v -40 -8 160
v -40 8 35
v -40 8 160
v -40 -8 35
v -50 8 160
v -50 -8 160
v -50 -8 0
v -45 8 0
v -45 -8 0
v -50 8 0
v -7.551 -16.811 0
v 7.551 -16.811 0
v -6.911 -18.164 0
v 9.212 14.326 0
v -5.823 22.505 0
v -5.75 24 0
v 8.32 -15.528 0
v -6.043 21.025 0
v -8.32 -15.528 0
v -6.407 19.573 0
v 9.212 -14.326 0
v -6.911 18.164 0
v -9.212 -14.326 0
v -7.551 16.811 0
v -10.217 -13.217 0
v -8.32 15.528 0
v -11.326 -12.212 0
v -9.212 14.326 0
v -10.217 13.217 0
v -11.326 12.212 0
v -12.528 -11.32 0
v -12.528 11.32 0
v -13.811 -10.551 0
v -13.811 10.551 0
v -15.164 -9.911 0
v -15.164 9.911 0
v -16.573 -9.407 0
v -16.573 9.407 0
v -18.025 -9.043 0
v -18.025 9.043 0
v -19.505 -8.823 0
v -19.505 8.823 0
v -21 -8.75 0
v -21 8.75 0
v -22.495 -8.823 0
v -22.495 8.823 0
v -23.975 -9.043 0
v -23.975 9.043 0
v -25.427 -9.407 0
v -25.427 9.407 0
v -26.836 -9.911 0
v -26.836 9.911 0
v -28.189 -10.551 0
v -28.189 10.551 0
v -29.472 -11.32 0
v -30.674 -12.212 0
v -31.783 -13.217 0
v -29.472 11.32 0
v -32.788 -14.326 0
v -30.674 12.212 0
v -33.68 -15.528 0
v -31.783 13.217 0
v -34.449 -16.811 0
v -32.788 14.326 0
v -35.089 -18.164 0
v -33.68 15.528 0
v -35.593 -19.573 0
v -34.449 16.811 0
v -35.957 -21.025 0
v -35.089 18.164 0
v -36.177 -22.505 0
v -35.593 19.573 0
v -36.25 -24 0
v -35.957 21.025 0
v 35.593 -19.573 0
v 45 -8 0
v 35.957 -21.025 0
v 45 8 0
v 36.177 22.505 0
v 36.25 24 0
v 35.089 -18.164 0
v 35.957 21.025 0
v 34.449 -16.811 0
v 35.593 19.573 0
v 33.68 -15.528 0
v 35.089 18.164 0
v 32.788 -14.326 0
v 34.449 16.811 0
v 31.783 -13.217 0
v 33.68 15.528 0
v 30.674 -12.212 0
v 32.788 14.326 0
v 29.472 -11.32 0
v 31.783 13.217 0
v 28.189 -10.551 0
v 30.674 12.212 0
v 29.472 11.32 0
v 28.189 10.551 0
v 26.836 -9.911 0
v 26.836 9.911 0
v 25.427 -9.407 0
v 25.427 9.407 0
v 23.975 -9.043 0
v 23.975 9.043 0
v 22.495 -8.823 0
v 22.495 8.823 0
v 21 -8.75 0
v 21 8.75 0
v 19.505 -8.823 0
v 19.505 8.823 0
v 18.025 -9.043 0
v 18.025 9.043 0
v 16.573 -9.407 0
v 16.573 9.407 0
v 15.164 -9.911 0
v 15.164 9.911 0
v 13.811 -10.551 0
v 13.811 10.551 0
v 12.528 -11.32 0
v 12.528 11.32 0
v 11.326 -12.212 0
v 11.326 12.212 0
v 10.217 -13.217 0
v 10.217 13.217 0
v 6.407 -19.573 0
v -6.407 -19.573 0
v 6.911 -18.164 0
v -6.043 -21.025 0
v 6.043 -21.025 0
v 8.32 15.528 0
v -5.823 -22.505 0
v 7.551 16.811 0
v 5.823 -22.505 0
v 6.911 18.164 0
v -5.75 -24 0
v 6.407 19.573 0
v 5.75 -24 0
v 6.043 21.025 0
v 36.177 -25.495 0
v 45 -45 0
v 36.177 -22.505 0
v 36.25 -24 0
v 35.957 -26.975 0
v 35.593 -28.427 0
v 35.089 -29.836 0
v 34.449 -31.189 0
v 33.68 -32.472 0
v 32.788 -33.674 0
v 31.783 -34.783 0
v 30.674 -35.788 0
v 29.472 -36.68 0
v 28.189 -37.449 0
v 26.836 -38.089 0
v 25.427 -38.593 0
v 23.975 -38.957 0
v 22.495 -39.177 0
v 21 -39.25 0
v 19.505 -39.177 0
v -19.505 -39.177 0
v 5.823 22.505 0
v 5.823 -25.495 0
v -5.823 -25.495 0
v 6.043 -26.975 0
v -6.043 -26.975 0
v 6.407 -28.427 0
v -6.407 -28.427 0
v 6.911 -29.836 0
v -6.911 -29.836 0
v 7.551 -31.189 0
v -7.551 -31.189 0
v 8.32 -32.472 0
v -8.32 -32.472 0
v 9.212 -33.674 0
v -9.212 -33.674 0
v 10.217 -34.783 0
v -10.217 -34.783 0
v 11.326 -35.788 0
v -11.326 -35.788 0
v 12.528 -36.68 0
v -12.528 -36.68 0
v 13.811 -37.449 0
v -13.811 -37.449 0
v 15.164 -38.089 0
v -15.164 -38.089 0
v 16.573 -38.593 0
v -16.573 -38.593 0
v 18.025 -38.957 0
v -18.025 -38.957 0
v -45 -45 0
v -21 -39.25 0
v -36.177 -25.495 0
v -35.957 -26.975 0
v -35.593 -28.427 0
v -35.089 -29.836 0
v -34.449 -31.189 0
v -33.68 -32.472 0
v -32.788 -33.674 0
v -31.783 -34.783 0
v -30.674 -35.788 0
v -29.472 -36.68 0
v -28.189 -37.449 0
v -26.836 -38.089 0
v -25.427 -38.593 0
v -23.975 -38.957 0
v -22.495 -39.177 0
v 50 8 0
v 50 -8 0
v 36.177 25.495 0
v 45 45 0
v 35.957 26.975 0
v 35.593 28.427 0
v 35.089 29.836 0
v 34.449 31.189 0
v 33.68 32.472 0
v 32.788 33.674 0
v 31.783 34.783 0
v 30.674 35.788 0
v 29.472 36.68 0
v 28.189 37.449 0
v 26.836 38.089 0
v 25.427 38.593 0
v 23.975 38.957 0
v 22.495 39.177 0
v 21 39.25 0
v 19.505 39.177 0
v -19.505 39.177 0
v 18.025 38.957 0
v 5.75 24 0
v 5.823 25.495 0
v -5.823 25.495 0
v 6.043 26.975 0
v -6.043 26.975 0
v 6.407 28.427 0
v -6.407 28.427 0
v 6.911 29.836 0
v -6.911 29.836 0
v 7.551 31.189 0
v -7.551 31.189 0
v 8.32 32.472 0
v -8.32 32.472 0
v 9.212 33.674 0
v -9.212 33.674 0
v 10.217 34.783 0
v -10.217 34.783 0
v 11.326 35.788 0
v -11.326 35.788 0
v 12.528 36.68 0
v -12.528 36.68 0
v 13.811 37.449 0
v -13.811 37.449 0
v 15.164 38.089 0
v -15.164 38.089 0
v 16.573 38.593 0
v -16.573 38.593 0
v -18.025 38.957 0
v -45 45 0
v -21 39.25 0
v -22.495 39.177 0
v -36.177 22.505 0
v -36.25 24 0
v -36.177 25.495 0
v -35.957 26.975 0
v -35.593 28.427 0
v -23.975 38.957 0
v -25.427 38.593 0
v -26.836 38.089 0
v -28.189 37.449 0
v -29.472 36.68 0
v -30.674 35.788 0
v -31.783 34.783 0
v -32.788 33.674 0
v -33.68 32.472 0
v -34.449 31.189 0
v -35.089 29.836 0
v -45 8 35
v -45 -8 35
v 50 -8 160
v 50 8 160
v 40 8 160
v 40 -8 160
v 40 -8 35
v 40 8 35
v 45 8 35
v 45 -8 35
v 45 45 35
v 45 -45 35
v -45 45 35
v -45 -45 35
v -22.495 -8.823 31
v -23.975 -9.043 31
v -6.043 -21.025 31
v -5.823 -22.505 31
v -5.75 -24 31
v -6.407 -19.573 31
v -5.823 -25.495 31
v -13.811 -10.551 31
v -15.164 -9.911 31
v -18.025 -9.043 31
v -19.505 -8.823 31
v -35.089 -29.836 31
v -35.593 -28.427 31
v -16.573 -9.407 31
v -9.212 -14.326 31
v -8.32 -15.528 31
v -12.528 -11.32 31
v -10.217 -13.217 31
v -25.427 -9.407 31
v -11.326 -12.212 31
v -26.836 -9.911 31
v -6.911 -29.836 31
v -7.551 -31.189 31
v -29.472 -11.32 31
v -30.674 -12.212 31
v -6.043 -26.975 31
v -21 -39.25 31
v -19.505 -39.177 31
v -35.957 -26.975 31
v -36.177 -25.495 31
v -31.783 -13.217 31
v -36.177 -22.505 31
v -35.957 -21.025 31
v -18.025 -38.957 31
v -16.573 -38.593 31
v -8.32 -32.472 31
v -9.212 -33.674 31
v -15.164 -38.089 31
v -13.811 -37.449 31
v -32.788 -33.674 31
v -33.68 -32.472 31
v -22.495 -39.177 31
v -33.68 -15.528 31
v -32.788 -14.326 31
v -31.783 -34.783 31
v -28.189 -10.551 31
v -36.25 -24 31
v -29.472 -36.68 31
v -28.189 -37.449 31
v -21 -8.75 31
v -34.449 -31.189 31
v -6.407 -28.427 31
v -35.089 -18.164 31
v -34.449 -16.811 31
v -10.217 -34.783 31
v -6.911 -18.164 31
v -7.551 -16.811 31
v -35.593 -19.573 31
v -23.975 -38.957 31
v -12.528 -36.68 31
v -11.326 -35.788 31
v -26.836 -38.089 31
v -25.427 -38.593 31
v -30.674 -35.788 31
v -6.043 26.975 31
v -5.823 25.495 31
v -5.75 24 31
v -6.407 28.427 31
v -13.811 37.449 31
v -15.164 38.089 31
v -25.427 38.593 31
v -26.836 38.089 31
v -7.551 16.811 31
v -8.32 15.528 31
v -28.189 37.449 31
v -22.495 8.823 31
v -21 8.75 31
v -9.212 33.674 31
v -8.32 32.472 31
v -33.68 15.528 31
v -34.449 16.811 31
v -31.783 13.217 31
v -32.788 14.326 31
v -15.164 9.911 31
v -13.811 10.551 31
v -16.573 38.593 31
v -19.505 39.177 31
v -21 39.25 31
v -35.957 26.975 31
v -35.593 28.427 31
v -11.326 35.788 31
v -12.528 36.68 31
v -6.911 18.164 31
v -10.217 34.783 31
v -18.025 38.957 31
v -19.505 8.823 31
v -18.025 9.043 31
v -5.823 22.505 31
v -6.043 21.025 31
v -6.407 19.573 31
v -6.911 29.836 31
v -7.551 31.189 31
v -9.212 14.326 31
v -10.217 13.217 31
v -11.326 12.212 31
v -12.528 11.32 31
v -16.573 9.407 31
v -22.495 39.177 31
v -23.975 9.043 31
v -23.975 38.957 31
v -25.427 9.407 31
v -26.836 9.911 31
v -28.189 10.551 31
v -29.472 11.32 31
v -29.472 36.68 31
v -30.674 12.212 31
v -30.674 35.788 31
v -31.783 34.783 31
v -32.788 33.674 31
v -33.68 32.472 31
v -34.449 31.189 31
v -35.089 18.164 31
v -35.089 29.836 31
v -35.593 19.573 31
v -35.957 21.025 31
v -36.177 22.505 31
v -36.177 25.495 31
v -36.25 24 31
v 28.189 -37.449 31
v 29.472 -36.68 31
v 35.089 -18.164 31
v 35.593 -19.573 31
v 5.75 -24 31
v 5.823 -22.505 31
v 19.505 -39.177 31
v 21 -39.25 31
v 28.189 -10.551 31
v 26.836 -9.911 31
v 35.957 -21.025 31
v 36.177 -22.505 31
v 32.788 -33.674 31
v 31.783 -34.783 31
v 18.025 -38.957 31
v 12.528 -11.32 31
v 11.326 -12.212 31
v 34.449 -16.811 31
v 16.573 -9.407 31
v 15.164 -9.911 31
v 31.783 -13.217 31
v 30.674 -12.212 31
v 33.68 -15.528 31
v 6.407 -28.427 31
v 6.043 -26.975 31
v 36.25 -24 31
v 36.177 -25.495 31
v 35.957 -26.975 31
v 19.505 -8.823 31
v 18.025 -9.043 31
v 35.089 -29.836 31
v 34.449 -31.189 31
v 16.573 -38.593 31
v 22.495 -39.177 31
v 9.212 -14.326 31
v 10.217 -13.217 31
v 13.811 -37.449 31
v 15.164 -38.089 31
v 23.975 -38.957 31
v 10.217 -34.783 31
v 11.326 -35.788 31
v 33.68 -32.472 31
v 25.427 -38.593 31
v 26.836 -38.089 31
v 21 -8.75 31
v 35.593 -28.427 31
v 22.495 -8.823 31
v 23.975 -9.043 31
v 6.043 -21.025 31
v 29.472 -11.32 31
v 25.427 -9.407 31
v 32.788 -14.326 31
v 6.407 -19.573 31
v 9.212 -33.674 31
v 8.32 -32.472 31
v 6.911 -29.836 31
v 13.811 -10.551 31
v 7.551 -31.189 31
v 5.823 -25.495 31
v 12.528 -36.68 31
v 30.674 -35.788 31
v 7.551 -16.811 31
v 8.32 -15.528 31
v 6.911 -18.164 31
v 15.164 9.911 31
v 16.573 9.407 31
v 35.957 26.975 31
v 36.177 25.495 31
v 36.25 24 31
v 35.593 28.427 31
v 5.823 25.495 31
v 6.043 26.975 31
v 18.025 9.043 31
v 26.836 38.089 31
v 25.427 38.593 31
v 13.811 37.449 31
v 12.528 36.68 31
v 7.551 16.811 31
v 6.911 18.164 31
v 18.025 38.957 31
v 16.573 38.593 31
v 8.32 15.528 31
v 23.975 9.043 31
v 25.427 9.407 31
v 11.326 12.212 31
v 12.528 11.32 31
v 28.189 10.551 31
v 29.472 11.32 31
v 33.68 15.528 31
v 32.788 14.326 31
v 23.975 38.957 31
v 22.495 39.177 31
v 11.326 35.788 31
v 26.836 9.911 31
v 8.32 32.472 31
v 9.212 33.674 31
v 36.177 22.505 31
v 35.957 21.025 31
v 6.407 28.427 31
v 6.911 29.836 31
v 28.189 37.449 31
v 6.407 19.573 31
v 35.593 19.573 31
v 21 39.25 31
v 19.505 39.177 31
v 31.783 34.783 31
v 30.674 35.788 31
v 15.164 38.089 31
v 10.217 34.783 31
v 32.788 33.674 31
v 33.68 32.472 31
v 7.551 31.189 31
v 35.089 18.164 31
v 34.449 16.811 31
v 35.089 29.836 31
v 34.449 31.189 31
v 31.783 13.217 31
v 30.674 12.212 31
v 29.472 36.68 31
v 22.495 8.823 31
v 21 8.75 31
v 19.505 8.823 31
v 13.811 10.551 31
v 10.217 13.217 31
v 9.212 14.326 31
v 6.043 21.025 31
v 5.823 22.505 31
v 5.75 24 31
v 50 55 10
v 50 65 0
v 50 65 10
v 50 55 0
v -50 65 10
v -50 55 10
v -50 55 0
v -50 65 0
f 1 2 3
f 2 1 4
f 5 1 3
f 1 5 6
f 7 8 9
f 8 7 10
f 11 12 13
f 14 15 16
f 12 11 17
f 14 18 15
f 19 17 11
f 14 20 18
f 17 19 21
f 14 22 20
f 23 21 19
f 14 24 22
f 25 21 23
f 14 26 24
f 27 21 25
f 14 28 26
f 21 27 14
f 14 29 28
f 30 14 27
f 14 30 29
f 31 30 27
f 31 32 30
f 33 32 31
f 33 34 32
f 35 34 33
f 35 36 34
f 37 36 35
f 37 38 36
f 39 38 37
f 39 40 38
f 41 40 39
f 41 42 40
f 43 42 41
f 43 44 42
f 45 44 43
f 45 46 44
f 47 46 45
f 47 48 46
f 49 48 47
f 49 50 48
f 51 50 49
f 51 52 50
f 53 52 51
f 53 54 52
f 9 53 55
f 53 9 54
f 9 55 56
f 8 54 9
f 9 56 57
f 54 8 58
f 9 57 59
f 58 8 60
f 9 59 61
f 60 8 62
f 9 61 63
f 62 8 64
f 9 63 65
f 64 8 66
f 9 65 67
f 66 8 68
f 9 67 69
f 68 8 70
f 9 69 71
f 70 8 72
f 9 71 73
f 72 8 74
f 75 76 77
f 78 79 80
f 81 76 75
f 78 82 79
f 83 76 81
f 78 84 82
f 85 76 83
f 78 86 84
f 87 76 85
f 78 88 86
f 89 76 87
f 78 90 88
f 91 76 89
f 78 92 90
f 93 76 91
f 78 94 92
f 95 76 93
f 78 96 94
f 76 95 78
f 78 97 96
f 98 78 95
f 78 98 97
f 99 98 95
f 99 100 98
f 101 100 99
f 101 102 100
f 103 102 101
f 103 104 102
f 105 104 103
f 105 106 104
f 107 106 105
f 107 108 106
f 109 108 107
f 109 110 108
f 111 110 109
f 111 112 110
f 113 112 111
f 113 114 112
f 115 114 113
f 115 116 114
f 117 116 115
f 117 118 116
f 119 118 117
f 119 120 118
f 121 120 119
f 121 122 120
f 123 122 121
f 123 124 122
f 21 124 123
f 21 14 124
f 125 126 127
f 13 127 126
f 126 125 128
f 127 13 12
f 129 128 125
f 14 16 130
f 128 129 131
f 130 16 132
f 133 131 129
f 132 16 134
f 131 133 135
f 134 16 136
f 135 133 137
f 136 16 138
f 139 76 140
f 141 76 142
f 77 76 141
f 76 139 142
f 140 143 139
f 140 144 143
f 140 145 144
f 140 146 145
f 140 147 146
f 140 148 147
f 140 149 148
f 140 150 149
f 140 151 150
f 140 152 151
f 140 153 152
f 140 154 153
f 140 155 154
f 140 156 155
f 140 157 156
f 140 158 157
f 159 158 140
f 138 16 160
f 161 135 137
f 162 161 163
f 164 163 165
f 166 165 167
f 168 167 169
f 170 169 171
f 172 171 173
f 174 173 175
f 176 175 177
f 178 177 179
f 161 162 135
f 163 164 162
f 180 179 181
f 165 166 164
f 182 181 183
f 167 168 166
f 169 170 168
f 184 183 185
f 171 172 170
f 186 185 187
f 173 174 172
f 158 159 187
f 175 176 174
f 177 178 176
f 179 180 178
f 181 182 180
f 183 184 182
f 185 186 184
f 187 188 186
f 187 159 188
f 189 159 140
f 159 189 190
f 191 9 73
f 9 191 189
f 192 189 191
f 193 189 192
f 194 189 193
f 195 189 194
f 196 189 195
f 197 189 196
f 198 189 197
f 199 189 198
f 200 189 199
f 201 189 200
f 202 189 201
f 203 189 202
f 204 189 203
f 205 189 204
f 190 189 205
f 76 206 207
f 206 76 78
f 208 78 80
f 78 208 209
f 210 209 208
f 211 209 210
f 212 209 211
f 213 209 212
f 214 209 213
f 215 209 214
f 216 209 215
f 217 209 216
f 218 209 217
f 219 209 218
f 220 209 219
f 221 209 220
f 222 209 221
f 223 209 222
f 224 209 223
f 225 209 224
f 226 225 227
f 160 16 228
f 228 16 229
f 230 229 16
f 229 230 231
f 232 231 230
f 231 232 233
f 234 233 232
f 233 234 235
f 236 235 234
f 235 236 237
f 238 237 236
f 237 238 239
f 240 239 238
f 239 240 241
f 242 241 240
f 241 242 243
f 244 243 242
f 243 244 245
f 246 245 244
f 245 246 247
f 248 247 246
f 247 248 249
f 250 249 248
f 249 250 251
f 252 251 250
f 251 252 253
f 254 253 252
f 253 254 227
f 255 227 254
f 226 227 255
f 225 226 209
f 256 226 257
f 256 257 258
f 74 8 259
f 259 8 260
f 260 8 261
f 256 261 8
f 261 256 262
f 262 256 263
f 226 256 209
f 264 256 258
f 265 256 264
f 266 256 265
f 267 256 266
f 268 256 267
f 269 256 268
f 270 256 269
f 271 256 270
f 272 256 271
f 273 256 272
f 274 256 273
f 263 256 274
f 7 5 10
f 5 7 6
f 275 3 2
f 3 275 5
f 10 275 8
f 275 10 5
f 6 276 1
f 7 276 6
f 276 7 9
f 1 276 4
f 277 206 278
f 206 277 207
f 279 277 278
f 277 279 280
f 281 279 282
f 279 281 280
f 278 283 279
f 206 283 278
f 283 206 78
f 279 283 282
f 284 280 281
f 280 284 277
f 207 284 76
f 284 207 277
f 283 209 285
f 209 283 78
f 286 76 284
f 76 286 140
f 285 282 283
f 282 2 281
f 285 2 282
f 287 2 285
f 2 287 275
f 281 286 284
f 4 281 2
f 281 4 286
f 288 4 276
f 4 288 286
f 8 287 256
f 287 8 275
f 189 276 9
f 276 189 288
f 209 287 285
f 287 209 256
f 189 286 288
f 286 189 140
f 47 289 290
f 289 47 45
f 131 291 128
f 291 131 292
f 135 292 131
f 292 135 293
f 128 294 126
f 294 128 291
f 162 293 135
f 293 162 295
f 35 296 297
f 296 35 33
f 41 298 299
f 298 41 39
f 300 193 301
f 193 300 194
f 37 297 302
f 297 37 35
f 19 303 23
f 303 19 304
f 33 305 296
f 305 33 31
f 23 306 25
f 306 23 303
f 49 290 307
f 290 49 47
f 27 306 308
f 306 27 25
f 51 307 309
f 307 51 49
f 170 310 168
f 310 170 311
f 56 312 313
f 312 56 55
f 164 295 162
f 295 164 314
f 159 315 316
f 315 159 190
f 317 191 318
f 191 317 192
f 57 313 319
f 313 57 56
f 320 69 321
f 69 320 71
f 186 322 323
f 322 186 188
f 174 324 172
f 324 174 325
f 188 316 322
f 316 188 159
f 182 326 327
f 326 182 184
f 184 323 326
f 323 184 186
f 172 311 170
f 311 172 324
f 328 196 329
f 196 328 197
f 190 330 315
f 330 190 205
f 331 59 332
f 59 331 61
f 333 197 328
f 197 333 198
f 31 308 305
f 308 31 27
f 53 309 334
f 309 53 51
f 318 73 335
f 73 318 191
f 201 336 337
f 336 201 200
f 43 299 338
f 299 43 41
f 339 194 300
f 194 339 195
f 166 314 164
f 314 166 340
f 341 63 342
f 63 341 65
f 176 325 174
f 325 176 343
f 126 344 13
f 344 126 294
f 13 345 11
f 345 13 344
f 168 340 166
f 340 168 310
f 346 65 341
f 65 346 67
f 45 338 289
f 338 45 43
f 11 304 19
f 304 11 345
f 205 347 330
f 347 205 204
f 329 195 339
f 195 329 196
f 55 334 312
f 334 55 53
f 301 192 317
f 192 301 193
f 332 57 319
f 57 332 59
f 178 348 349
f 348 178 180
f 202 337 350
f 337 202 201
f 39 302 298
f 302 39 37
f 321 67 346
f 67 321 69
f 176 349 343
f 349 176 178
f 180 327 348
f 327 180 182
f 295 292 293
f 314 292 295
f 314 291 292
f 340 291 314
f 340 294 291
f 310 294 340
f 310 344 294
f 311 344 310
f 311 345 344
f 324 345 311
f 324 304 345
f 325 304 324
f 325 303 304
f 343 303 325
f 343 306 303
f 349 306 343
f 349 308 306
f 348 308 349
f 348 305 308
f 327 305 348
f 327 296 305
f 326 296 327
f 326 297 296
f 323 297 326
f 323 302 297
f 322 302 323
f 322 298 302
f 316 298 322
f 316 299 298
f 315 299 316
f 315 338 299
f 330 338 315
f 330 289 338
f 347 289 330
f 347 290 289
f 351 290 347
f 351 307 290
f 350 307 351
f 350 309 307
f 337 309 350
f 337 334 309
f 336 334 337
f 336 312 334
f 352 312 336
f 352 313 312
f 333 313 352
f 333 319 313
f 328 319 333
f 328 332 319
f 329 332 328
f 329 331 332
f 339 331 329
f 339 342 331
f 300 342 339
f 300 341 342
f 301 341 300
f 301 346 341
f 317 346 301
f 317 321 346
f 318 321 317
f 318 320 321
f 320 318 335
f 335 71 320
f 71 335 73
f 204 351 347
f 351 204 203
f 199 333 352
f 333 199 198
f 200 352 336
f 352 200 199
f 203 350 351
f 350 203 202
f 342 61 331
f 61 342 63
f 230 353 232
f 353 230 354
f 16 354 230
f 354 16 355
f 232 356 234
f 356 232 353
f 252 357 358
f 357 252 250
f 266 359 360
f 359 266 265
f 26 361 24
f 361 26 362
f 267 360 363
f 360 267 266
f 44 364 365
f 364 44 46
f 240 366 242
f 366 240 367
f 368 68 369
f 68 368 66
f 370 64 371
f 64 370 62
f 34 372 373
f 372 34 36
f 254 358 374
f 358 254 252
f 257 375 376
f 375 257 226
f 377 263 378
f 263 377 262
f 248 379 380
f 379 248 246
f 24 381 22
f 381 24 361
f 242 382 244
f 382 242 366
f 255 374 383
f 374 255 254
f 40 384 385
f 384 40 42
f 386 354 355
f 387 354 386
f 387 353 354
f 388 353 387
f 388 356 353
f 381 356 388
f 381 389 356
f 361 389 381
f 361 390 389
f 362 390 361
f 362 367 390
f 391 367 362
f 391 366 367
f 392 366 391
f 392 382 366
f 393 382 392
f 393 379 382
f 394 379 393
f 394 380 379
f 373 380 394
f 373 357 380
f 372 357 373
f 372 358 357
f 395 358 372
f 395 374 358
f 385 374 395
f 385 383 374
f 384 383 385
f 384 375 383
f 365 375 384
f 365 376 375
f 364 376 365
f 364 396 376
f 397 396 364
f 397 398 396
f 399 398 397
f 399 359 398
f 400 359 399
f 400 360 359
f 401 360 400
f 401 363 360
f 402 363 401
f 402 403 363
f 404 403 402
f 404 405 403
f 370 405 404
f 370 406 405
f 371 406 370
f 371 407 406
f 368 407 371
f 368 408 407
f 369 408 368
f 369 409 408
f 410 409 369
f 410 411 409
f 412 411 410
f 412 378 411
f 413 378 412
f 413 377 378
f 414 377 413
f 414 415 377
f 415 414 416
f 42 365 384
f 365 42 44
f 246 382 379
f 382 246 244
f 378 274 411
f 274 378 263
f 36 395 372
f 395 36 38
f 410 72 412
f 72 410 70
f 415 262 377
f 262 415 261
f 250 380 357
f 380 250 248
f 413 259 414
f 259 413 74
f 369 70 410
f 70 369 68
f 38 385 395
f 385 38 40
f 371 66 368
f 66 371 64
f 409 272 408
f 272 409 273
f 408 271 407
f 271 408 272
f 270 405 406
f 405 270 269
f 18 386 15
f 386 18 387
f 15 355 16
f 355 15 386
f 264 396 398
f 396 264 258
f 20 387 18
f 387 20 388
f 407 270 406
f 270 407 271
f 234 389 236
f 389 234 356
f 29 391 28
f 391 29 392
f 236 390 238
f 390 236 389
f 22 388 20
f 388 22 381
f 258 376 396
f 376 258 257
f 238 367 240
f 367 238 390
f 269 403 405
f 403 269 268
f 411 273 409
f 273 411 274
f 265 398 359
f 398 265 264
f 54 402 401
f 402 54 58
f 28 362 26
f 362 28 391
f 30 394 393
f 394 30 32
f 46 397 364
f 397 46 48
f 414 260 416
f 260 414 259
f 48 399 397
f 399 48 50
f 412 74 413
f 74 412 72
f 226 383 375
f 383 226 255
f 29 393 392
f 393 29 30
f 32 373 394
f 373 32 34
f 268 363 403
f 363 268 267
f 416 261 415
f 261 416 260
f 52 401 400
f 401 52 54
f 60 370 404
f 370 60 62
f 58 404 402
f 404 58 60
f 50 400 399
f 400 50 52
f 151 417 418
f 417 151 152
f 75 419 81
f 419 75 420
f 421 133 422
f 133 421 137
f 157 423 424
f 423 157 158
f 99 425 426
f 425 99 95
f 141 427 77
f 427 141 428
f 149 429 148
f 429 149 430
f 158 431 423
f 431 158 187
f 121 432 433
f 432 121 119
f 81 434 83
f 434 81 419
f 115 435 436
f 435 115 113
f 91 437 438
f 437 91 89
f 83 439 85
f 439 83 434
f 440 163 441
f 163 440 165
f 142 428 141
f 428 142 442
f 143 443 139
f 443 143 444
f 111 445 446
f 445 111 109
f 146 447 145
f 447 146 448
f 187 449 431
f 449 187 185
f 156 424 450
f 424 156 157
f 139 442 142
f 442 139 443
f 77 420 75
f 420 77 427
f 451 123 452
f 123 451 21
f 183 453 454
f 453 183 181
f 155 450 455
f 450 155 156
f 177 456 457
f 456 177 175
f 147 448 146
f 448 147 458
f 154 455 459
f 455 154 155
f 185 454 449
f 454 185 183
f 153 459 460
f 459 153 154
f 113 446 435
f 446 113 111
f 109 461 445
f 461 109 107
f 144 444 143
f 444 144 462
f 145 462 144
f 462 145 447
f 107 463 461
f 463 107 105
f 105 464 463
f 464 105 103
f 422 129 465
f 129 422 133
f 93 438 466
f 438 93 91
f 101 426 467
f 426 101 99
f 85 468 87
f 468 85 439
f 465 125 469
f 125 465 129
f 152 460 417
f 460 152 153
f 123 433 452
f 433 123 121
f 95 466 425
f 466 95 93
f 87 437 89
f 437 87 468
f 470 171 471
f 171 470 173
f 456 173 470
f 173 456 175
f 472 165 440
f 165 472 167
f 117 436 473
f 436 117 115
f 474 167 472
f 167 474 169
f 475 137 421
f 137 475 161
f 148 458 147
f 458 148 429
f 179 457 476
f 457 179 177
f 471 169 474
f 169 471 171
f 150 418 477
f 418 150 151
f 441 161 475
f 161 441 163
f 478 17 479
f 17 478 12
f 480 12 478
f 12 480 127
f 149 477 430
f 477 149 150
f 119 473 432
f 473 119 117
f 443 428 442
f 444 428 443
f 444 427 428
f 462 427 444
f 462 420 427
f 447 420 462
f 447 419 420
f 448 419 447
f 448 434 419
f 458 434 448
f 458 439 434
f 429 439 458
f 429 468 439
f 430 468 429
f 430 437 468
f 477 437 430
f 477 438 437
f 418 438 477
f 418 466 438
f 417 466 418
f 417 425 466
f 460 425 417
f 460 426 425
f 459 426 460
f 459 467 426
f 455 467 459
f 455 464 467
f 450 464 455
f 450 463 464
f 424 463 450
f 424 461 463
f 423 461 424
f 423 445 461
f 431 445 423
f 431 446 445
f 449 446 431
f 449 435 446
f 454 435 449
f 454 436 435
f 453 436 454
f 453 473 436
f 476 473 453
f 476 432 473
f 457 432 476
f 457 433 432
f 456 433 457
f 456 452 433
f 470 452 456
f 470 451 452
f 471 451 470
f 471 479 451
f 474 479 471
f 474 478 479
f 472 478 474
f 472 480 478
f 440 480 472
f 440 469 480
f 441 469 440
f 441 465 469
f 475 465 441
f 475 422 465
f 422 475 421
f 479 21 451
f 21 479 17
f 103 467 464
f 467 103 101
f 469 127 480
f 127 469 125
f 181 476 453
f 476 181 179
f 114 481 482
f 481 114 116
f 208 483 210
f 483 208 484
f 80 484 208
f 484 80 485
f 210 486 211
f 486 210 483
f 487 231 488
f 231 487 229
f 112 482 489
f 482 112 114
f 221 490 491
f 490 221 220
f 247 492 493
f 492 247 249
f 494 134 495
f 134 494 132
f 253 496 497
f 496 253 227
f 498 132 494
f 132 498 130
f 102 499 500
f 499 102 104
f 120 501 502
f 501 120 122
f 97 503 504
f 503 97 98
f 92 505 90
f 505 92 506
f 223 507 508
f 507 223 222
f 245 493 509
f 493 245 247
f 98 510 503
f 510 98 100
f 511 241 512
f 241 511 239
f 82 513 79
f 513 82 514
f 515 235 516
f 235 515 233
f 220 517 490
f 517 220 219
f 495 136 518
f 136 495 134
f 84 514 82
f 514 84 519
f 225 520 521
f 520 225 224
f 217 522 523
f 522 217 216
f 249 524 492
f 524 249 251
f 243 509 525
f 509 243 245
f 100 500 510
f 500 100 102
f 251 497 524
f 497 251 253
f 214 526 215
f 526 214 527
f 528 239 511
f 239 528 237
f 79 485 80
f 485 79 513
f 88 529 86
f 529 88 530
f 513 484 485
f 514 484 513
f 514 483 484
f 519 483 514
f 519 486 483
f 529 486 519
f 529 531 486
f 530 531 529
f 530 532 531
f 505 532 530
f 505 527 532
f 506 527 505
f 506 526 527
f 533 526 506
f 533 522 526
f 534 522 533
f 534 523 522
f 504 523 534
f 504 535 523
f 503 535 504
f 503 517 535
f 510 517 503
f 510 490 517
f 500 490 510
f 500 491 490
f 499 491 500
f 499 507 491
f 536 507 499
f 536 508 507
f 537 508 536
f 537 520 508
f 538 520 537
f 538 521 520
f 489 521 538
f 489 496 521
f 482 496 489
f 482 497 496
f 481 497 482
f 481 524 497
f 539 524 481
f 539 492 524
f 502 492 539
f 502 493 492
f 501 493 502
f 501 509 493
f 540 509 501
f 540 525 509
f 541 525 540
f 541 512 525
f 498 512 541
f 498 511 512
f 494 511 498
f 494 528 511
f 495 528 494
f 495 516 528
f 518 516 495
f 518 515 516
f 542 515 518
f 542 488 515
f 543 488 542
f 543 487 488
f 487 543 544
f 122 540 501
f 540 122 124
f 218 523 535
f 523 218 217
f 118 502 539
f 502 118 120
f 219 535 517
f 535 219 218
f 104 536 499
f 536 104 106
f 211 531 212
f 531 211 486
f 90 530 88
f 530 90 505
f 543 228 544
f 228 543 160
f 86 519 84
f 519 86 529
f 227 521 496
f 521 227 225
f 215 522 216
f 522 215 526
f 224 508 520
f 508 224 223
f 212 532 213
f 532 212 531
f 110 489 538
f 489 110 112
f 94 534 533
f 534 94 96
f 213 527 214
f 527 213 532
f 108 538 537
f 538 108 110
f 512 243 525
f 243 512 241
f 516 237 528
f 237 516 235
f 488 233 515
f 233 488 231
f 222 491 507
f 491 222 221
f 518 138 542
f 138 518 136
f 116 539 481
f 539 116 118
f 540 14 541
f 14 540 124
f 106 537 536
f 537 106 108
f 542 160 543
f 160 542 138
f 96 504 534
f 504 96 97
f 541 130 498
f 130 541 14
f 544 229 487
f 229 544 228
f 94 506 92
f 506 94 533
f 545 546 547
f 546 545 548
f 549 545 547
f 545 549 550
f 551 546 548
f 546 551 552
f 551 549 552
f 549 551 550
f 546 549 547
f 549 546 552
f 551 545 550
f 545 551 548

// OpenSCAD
// =====================================================================
// 4x 50 mL conical tube carrier, printed as two parts side by side.
// Part 1: base block + two posts (posts have square through-holes).
// Part 2: square handle bar (pushed through both posts after printing).
// Units: mm.  Print orientation: parts rest on XY plane (z = 0), +Z up.
// =====================================================================

$fn = 64;

// ---------------- Part 1 : base block ----------------
base_w   = 90;   // X extent of base block
base_d   = 90;   // Y extent of base block
base_h   = 35;   // Z height of base block

// Blind tube seats (50 mL conical tubes)
seat_d   = 30.5; // seat diameter
seat_dep = 30;   // seat depth (leaves a 5 mm floor)
seat_x   = [-21, 21];   // X centres of the four seats
seat_y   = [-24, 24];   // Y centres of the four seats

// ---------------- Part 1 : posts ----------------
post_t   = 10;   // post thickness along X
post_w   = 16;   // post width along Y
post_h   = 160;  // post height (z = 0 .. 160)
post_x   = [-45, 45]; // X centres (flush with the two X end faces)
post_hole = 10.4;     // square through-hole size (X x Y)
post_hole_z = 150;    // Z centre of the square hole

// ---------------- Part 2 : handle bar ----------------
bar_s    = 10;   // square bar cross-section (X x Y)
bar_len  = 100;  // bar length along X
bar_y0   = 55;   // bar Y start (10 mm gap to the base +Y face at y = 45)
bar_y1   = 65;   // bar Y end

// =====================================================================
// PART 1  (base + posts, centred on the origin in X and Y)
// =====================================================================
part1();

// =====================================================================
// PART 2  (handle bar, offset in +Y so it prints beside part 1)
// =====================================================================
part2();

// ---------------------------------------------------------------------
// Part 1 : base block with four blind seats, plus two posts with square
//          through-holes.  Posts are unioned onto the base, then the
//          square holes are cut (cutters extend 1 mm past each face).
// ---------------------------------------------------------------------
module part1() {
    difference() {
        // solid to be cut: base block + two posts
        union() {
            // --- base block ---
            translate([-base_w/2, -base_d/2, 0])
                cube([base_w, base_d, base_h]);

            // --- two posts (unioned onto the base) ---
            for (px = post_x)
                translate([px - post_t/2, -post_w/2, 0])
                    cube([post_t, post_w, post_h]);
        }

        // four blind seats, cut 1 mm past the top face (z = 35)
        for (sx = seat_x)
            for (sy = seat_y)
                translate([sx, sy, 0])
                    cylinder(h = seat_dep + 1, d = seat_d, $fn = 64);

        // square through-holes in the two posts, cut 1 mm past each face
        for (px = post_x)
            translate([px - post_t/2 - 1,
                       post_hole_z - post_hole/2,
                       post_hole_z - post_hole/2])
                cube([post_t + 2, post_hole, post_hole]);
    }
}

// ---------------------------------------------------------------------
// Part 2 : square handle bar lying on the bed along X, centred on x = 0,
//          spanning y = 55 .. 65 (10 mm gap to the base +Y face).
// ---------------------------------------------------------------------
module part2() {
    translate([-bar_len/2, bar_y0, 0])
        cube([bar_len, bar_s, bar_s]);
}
